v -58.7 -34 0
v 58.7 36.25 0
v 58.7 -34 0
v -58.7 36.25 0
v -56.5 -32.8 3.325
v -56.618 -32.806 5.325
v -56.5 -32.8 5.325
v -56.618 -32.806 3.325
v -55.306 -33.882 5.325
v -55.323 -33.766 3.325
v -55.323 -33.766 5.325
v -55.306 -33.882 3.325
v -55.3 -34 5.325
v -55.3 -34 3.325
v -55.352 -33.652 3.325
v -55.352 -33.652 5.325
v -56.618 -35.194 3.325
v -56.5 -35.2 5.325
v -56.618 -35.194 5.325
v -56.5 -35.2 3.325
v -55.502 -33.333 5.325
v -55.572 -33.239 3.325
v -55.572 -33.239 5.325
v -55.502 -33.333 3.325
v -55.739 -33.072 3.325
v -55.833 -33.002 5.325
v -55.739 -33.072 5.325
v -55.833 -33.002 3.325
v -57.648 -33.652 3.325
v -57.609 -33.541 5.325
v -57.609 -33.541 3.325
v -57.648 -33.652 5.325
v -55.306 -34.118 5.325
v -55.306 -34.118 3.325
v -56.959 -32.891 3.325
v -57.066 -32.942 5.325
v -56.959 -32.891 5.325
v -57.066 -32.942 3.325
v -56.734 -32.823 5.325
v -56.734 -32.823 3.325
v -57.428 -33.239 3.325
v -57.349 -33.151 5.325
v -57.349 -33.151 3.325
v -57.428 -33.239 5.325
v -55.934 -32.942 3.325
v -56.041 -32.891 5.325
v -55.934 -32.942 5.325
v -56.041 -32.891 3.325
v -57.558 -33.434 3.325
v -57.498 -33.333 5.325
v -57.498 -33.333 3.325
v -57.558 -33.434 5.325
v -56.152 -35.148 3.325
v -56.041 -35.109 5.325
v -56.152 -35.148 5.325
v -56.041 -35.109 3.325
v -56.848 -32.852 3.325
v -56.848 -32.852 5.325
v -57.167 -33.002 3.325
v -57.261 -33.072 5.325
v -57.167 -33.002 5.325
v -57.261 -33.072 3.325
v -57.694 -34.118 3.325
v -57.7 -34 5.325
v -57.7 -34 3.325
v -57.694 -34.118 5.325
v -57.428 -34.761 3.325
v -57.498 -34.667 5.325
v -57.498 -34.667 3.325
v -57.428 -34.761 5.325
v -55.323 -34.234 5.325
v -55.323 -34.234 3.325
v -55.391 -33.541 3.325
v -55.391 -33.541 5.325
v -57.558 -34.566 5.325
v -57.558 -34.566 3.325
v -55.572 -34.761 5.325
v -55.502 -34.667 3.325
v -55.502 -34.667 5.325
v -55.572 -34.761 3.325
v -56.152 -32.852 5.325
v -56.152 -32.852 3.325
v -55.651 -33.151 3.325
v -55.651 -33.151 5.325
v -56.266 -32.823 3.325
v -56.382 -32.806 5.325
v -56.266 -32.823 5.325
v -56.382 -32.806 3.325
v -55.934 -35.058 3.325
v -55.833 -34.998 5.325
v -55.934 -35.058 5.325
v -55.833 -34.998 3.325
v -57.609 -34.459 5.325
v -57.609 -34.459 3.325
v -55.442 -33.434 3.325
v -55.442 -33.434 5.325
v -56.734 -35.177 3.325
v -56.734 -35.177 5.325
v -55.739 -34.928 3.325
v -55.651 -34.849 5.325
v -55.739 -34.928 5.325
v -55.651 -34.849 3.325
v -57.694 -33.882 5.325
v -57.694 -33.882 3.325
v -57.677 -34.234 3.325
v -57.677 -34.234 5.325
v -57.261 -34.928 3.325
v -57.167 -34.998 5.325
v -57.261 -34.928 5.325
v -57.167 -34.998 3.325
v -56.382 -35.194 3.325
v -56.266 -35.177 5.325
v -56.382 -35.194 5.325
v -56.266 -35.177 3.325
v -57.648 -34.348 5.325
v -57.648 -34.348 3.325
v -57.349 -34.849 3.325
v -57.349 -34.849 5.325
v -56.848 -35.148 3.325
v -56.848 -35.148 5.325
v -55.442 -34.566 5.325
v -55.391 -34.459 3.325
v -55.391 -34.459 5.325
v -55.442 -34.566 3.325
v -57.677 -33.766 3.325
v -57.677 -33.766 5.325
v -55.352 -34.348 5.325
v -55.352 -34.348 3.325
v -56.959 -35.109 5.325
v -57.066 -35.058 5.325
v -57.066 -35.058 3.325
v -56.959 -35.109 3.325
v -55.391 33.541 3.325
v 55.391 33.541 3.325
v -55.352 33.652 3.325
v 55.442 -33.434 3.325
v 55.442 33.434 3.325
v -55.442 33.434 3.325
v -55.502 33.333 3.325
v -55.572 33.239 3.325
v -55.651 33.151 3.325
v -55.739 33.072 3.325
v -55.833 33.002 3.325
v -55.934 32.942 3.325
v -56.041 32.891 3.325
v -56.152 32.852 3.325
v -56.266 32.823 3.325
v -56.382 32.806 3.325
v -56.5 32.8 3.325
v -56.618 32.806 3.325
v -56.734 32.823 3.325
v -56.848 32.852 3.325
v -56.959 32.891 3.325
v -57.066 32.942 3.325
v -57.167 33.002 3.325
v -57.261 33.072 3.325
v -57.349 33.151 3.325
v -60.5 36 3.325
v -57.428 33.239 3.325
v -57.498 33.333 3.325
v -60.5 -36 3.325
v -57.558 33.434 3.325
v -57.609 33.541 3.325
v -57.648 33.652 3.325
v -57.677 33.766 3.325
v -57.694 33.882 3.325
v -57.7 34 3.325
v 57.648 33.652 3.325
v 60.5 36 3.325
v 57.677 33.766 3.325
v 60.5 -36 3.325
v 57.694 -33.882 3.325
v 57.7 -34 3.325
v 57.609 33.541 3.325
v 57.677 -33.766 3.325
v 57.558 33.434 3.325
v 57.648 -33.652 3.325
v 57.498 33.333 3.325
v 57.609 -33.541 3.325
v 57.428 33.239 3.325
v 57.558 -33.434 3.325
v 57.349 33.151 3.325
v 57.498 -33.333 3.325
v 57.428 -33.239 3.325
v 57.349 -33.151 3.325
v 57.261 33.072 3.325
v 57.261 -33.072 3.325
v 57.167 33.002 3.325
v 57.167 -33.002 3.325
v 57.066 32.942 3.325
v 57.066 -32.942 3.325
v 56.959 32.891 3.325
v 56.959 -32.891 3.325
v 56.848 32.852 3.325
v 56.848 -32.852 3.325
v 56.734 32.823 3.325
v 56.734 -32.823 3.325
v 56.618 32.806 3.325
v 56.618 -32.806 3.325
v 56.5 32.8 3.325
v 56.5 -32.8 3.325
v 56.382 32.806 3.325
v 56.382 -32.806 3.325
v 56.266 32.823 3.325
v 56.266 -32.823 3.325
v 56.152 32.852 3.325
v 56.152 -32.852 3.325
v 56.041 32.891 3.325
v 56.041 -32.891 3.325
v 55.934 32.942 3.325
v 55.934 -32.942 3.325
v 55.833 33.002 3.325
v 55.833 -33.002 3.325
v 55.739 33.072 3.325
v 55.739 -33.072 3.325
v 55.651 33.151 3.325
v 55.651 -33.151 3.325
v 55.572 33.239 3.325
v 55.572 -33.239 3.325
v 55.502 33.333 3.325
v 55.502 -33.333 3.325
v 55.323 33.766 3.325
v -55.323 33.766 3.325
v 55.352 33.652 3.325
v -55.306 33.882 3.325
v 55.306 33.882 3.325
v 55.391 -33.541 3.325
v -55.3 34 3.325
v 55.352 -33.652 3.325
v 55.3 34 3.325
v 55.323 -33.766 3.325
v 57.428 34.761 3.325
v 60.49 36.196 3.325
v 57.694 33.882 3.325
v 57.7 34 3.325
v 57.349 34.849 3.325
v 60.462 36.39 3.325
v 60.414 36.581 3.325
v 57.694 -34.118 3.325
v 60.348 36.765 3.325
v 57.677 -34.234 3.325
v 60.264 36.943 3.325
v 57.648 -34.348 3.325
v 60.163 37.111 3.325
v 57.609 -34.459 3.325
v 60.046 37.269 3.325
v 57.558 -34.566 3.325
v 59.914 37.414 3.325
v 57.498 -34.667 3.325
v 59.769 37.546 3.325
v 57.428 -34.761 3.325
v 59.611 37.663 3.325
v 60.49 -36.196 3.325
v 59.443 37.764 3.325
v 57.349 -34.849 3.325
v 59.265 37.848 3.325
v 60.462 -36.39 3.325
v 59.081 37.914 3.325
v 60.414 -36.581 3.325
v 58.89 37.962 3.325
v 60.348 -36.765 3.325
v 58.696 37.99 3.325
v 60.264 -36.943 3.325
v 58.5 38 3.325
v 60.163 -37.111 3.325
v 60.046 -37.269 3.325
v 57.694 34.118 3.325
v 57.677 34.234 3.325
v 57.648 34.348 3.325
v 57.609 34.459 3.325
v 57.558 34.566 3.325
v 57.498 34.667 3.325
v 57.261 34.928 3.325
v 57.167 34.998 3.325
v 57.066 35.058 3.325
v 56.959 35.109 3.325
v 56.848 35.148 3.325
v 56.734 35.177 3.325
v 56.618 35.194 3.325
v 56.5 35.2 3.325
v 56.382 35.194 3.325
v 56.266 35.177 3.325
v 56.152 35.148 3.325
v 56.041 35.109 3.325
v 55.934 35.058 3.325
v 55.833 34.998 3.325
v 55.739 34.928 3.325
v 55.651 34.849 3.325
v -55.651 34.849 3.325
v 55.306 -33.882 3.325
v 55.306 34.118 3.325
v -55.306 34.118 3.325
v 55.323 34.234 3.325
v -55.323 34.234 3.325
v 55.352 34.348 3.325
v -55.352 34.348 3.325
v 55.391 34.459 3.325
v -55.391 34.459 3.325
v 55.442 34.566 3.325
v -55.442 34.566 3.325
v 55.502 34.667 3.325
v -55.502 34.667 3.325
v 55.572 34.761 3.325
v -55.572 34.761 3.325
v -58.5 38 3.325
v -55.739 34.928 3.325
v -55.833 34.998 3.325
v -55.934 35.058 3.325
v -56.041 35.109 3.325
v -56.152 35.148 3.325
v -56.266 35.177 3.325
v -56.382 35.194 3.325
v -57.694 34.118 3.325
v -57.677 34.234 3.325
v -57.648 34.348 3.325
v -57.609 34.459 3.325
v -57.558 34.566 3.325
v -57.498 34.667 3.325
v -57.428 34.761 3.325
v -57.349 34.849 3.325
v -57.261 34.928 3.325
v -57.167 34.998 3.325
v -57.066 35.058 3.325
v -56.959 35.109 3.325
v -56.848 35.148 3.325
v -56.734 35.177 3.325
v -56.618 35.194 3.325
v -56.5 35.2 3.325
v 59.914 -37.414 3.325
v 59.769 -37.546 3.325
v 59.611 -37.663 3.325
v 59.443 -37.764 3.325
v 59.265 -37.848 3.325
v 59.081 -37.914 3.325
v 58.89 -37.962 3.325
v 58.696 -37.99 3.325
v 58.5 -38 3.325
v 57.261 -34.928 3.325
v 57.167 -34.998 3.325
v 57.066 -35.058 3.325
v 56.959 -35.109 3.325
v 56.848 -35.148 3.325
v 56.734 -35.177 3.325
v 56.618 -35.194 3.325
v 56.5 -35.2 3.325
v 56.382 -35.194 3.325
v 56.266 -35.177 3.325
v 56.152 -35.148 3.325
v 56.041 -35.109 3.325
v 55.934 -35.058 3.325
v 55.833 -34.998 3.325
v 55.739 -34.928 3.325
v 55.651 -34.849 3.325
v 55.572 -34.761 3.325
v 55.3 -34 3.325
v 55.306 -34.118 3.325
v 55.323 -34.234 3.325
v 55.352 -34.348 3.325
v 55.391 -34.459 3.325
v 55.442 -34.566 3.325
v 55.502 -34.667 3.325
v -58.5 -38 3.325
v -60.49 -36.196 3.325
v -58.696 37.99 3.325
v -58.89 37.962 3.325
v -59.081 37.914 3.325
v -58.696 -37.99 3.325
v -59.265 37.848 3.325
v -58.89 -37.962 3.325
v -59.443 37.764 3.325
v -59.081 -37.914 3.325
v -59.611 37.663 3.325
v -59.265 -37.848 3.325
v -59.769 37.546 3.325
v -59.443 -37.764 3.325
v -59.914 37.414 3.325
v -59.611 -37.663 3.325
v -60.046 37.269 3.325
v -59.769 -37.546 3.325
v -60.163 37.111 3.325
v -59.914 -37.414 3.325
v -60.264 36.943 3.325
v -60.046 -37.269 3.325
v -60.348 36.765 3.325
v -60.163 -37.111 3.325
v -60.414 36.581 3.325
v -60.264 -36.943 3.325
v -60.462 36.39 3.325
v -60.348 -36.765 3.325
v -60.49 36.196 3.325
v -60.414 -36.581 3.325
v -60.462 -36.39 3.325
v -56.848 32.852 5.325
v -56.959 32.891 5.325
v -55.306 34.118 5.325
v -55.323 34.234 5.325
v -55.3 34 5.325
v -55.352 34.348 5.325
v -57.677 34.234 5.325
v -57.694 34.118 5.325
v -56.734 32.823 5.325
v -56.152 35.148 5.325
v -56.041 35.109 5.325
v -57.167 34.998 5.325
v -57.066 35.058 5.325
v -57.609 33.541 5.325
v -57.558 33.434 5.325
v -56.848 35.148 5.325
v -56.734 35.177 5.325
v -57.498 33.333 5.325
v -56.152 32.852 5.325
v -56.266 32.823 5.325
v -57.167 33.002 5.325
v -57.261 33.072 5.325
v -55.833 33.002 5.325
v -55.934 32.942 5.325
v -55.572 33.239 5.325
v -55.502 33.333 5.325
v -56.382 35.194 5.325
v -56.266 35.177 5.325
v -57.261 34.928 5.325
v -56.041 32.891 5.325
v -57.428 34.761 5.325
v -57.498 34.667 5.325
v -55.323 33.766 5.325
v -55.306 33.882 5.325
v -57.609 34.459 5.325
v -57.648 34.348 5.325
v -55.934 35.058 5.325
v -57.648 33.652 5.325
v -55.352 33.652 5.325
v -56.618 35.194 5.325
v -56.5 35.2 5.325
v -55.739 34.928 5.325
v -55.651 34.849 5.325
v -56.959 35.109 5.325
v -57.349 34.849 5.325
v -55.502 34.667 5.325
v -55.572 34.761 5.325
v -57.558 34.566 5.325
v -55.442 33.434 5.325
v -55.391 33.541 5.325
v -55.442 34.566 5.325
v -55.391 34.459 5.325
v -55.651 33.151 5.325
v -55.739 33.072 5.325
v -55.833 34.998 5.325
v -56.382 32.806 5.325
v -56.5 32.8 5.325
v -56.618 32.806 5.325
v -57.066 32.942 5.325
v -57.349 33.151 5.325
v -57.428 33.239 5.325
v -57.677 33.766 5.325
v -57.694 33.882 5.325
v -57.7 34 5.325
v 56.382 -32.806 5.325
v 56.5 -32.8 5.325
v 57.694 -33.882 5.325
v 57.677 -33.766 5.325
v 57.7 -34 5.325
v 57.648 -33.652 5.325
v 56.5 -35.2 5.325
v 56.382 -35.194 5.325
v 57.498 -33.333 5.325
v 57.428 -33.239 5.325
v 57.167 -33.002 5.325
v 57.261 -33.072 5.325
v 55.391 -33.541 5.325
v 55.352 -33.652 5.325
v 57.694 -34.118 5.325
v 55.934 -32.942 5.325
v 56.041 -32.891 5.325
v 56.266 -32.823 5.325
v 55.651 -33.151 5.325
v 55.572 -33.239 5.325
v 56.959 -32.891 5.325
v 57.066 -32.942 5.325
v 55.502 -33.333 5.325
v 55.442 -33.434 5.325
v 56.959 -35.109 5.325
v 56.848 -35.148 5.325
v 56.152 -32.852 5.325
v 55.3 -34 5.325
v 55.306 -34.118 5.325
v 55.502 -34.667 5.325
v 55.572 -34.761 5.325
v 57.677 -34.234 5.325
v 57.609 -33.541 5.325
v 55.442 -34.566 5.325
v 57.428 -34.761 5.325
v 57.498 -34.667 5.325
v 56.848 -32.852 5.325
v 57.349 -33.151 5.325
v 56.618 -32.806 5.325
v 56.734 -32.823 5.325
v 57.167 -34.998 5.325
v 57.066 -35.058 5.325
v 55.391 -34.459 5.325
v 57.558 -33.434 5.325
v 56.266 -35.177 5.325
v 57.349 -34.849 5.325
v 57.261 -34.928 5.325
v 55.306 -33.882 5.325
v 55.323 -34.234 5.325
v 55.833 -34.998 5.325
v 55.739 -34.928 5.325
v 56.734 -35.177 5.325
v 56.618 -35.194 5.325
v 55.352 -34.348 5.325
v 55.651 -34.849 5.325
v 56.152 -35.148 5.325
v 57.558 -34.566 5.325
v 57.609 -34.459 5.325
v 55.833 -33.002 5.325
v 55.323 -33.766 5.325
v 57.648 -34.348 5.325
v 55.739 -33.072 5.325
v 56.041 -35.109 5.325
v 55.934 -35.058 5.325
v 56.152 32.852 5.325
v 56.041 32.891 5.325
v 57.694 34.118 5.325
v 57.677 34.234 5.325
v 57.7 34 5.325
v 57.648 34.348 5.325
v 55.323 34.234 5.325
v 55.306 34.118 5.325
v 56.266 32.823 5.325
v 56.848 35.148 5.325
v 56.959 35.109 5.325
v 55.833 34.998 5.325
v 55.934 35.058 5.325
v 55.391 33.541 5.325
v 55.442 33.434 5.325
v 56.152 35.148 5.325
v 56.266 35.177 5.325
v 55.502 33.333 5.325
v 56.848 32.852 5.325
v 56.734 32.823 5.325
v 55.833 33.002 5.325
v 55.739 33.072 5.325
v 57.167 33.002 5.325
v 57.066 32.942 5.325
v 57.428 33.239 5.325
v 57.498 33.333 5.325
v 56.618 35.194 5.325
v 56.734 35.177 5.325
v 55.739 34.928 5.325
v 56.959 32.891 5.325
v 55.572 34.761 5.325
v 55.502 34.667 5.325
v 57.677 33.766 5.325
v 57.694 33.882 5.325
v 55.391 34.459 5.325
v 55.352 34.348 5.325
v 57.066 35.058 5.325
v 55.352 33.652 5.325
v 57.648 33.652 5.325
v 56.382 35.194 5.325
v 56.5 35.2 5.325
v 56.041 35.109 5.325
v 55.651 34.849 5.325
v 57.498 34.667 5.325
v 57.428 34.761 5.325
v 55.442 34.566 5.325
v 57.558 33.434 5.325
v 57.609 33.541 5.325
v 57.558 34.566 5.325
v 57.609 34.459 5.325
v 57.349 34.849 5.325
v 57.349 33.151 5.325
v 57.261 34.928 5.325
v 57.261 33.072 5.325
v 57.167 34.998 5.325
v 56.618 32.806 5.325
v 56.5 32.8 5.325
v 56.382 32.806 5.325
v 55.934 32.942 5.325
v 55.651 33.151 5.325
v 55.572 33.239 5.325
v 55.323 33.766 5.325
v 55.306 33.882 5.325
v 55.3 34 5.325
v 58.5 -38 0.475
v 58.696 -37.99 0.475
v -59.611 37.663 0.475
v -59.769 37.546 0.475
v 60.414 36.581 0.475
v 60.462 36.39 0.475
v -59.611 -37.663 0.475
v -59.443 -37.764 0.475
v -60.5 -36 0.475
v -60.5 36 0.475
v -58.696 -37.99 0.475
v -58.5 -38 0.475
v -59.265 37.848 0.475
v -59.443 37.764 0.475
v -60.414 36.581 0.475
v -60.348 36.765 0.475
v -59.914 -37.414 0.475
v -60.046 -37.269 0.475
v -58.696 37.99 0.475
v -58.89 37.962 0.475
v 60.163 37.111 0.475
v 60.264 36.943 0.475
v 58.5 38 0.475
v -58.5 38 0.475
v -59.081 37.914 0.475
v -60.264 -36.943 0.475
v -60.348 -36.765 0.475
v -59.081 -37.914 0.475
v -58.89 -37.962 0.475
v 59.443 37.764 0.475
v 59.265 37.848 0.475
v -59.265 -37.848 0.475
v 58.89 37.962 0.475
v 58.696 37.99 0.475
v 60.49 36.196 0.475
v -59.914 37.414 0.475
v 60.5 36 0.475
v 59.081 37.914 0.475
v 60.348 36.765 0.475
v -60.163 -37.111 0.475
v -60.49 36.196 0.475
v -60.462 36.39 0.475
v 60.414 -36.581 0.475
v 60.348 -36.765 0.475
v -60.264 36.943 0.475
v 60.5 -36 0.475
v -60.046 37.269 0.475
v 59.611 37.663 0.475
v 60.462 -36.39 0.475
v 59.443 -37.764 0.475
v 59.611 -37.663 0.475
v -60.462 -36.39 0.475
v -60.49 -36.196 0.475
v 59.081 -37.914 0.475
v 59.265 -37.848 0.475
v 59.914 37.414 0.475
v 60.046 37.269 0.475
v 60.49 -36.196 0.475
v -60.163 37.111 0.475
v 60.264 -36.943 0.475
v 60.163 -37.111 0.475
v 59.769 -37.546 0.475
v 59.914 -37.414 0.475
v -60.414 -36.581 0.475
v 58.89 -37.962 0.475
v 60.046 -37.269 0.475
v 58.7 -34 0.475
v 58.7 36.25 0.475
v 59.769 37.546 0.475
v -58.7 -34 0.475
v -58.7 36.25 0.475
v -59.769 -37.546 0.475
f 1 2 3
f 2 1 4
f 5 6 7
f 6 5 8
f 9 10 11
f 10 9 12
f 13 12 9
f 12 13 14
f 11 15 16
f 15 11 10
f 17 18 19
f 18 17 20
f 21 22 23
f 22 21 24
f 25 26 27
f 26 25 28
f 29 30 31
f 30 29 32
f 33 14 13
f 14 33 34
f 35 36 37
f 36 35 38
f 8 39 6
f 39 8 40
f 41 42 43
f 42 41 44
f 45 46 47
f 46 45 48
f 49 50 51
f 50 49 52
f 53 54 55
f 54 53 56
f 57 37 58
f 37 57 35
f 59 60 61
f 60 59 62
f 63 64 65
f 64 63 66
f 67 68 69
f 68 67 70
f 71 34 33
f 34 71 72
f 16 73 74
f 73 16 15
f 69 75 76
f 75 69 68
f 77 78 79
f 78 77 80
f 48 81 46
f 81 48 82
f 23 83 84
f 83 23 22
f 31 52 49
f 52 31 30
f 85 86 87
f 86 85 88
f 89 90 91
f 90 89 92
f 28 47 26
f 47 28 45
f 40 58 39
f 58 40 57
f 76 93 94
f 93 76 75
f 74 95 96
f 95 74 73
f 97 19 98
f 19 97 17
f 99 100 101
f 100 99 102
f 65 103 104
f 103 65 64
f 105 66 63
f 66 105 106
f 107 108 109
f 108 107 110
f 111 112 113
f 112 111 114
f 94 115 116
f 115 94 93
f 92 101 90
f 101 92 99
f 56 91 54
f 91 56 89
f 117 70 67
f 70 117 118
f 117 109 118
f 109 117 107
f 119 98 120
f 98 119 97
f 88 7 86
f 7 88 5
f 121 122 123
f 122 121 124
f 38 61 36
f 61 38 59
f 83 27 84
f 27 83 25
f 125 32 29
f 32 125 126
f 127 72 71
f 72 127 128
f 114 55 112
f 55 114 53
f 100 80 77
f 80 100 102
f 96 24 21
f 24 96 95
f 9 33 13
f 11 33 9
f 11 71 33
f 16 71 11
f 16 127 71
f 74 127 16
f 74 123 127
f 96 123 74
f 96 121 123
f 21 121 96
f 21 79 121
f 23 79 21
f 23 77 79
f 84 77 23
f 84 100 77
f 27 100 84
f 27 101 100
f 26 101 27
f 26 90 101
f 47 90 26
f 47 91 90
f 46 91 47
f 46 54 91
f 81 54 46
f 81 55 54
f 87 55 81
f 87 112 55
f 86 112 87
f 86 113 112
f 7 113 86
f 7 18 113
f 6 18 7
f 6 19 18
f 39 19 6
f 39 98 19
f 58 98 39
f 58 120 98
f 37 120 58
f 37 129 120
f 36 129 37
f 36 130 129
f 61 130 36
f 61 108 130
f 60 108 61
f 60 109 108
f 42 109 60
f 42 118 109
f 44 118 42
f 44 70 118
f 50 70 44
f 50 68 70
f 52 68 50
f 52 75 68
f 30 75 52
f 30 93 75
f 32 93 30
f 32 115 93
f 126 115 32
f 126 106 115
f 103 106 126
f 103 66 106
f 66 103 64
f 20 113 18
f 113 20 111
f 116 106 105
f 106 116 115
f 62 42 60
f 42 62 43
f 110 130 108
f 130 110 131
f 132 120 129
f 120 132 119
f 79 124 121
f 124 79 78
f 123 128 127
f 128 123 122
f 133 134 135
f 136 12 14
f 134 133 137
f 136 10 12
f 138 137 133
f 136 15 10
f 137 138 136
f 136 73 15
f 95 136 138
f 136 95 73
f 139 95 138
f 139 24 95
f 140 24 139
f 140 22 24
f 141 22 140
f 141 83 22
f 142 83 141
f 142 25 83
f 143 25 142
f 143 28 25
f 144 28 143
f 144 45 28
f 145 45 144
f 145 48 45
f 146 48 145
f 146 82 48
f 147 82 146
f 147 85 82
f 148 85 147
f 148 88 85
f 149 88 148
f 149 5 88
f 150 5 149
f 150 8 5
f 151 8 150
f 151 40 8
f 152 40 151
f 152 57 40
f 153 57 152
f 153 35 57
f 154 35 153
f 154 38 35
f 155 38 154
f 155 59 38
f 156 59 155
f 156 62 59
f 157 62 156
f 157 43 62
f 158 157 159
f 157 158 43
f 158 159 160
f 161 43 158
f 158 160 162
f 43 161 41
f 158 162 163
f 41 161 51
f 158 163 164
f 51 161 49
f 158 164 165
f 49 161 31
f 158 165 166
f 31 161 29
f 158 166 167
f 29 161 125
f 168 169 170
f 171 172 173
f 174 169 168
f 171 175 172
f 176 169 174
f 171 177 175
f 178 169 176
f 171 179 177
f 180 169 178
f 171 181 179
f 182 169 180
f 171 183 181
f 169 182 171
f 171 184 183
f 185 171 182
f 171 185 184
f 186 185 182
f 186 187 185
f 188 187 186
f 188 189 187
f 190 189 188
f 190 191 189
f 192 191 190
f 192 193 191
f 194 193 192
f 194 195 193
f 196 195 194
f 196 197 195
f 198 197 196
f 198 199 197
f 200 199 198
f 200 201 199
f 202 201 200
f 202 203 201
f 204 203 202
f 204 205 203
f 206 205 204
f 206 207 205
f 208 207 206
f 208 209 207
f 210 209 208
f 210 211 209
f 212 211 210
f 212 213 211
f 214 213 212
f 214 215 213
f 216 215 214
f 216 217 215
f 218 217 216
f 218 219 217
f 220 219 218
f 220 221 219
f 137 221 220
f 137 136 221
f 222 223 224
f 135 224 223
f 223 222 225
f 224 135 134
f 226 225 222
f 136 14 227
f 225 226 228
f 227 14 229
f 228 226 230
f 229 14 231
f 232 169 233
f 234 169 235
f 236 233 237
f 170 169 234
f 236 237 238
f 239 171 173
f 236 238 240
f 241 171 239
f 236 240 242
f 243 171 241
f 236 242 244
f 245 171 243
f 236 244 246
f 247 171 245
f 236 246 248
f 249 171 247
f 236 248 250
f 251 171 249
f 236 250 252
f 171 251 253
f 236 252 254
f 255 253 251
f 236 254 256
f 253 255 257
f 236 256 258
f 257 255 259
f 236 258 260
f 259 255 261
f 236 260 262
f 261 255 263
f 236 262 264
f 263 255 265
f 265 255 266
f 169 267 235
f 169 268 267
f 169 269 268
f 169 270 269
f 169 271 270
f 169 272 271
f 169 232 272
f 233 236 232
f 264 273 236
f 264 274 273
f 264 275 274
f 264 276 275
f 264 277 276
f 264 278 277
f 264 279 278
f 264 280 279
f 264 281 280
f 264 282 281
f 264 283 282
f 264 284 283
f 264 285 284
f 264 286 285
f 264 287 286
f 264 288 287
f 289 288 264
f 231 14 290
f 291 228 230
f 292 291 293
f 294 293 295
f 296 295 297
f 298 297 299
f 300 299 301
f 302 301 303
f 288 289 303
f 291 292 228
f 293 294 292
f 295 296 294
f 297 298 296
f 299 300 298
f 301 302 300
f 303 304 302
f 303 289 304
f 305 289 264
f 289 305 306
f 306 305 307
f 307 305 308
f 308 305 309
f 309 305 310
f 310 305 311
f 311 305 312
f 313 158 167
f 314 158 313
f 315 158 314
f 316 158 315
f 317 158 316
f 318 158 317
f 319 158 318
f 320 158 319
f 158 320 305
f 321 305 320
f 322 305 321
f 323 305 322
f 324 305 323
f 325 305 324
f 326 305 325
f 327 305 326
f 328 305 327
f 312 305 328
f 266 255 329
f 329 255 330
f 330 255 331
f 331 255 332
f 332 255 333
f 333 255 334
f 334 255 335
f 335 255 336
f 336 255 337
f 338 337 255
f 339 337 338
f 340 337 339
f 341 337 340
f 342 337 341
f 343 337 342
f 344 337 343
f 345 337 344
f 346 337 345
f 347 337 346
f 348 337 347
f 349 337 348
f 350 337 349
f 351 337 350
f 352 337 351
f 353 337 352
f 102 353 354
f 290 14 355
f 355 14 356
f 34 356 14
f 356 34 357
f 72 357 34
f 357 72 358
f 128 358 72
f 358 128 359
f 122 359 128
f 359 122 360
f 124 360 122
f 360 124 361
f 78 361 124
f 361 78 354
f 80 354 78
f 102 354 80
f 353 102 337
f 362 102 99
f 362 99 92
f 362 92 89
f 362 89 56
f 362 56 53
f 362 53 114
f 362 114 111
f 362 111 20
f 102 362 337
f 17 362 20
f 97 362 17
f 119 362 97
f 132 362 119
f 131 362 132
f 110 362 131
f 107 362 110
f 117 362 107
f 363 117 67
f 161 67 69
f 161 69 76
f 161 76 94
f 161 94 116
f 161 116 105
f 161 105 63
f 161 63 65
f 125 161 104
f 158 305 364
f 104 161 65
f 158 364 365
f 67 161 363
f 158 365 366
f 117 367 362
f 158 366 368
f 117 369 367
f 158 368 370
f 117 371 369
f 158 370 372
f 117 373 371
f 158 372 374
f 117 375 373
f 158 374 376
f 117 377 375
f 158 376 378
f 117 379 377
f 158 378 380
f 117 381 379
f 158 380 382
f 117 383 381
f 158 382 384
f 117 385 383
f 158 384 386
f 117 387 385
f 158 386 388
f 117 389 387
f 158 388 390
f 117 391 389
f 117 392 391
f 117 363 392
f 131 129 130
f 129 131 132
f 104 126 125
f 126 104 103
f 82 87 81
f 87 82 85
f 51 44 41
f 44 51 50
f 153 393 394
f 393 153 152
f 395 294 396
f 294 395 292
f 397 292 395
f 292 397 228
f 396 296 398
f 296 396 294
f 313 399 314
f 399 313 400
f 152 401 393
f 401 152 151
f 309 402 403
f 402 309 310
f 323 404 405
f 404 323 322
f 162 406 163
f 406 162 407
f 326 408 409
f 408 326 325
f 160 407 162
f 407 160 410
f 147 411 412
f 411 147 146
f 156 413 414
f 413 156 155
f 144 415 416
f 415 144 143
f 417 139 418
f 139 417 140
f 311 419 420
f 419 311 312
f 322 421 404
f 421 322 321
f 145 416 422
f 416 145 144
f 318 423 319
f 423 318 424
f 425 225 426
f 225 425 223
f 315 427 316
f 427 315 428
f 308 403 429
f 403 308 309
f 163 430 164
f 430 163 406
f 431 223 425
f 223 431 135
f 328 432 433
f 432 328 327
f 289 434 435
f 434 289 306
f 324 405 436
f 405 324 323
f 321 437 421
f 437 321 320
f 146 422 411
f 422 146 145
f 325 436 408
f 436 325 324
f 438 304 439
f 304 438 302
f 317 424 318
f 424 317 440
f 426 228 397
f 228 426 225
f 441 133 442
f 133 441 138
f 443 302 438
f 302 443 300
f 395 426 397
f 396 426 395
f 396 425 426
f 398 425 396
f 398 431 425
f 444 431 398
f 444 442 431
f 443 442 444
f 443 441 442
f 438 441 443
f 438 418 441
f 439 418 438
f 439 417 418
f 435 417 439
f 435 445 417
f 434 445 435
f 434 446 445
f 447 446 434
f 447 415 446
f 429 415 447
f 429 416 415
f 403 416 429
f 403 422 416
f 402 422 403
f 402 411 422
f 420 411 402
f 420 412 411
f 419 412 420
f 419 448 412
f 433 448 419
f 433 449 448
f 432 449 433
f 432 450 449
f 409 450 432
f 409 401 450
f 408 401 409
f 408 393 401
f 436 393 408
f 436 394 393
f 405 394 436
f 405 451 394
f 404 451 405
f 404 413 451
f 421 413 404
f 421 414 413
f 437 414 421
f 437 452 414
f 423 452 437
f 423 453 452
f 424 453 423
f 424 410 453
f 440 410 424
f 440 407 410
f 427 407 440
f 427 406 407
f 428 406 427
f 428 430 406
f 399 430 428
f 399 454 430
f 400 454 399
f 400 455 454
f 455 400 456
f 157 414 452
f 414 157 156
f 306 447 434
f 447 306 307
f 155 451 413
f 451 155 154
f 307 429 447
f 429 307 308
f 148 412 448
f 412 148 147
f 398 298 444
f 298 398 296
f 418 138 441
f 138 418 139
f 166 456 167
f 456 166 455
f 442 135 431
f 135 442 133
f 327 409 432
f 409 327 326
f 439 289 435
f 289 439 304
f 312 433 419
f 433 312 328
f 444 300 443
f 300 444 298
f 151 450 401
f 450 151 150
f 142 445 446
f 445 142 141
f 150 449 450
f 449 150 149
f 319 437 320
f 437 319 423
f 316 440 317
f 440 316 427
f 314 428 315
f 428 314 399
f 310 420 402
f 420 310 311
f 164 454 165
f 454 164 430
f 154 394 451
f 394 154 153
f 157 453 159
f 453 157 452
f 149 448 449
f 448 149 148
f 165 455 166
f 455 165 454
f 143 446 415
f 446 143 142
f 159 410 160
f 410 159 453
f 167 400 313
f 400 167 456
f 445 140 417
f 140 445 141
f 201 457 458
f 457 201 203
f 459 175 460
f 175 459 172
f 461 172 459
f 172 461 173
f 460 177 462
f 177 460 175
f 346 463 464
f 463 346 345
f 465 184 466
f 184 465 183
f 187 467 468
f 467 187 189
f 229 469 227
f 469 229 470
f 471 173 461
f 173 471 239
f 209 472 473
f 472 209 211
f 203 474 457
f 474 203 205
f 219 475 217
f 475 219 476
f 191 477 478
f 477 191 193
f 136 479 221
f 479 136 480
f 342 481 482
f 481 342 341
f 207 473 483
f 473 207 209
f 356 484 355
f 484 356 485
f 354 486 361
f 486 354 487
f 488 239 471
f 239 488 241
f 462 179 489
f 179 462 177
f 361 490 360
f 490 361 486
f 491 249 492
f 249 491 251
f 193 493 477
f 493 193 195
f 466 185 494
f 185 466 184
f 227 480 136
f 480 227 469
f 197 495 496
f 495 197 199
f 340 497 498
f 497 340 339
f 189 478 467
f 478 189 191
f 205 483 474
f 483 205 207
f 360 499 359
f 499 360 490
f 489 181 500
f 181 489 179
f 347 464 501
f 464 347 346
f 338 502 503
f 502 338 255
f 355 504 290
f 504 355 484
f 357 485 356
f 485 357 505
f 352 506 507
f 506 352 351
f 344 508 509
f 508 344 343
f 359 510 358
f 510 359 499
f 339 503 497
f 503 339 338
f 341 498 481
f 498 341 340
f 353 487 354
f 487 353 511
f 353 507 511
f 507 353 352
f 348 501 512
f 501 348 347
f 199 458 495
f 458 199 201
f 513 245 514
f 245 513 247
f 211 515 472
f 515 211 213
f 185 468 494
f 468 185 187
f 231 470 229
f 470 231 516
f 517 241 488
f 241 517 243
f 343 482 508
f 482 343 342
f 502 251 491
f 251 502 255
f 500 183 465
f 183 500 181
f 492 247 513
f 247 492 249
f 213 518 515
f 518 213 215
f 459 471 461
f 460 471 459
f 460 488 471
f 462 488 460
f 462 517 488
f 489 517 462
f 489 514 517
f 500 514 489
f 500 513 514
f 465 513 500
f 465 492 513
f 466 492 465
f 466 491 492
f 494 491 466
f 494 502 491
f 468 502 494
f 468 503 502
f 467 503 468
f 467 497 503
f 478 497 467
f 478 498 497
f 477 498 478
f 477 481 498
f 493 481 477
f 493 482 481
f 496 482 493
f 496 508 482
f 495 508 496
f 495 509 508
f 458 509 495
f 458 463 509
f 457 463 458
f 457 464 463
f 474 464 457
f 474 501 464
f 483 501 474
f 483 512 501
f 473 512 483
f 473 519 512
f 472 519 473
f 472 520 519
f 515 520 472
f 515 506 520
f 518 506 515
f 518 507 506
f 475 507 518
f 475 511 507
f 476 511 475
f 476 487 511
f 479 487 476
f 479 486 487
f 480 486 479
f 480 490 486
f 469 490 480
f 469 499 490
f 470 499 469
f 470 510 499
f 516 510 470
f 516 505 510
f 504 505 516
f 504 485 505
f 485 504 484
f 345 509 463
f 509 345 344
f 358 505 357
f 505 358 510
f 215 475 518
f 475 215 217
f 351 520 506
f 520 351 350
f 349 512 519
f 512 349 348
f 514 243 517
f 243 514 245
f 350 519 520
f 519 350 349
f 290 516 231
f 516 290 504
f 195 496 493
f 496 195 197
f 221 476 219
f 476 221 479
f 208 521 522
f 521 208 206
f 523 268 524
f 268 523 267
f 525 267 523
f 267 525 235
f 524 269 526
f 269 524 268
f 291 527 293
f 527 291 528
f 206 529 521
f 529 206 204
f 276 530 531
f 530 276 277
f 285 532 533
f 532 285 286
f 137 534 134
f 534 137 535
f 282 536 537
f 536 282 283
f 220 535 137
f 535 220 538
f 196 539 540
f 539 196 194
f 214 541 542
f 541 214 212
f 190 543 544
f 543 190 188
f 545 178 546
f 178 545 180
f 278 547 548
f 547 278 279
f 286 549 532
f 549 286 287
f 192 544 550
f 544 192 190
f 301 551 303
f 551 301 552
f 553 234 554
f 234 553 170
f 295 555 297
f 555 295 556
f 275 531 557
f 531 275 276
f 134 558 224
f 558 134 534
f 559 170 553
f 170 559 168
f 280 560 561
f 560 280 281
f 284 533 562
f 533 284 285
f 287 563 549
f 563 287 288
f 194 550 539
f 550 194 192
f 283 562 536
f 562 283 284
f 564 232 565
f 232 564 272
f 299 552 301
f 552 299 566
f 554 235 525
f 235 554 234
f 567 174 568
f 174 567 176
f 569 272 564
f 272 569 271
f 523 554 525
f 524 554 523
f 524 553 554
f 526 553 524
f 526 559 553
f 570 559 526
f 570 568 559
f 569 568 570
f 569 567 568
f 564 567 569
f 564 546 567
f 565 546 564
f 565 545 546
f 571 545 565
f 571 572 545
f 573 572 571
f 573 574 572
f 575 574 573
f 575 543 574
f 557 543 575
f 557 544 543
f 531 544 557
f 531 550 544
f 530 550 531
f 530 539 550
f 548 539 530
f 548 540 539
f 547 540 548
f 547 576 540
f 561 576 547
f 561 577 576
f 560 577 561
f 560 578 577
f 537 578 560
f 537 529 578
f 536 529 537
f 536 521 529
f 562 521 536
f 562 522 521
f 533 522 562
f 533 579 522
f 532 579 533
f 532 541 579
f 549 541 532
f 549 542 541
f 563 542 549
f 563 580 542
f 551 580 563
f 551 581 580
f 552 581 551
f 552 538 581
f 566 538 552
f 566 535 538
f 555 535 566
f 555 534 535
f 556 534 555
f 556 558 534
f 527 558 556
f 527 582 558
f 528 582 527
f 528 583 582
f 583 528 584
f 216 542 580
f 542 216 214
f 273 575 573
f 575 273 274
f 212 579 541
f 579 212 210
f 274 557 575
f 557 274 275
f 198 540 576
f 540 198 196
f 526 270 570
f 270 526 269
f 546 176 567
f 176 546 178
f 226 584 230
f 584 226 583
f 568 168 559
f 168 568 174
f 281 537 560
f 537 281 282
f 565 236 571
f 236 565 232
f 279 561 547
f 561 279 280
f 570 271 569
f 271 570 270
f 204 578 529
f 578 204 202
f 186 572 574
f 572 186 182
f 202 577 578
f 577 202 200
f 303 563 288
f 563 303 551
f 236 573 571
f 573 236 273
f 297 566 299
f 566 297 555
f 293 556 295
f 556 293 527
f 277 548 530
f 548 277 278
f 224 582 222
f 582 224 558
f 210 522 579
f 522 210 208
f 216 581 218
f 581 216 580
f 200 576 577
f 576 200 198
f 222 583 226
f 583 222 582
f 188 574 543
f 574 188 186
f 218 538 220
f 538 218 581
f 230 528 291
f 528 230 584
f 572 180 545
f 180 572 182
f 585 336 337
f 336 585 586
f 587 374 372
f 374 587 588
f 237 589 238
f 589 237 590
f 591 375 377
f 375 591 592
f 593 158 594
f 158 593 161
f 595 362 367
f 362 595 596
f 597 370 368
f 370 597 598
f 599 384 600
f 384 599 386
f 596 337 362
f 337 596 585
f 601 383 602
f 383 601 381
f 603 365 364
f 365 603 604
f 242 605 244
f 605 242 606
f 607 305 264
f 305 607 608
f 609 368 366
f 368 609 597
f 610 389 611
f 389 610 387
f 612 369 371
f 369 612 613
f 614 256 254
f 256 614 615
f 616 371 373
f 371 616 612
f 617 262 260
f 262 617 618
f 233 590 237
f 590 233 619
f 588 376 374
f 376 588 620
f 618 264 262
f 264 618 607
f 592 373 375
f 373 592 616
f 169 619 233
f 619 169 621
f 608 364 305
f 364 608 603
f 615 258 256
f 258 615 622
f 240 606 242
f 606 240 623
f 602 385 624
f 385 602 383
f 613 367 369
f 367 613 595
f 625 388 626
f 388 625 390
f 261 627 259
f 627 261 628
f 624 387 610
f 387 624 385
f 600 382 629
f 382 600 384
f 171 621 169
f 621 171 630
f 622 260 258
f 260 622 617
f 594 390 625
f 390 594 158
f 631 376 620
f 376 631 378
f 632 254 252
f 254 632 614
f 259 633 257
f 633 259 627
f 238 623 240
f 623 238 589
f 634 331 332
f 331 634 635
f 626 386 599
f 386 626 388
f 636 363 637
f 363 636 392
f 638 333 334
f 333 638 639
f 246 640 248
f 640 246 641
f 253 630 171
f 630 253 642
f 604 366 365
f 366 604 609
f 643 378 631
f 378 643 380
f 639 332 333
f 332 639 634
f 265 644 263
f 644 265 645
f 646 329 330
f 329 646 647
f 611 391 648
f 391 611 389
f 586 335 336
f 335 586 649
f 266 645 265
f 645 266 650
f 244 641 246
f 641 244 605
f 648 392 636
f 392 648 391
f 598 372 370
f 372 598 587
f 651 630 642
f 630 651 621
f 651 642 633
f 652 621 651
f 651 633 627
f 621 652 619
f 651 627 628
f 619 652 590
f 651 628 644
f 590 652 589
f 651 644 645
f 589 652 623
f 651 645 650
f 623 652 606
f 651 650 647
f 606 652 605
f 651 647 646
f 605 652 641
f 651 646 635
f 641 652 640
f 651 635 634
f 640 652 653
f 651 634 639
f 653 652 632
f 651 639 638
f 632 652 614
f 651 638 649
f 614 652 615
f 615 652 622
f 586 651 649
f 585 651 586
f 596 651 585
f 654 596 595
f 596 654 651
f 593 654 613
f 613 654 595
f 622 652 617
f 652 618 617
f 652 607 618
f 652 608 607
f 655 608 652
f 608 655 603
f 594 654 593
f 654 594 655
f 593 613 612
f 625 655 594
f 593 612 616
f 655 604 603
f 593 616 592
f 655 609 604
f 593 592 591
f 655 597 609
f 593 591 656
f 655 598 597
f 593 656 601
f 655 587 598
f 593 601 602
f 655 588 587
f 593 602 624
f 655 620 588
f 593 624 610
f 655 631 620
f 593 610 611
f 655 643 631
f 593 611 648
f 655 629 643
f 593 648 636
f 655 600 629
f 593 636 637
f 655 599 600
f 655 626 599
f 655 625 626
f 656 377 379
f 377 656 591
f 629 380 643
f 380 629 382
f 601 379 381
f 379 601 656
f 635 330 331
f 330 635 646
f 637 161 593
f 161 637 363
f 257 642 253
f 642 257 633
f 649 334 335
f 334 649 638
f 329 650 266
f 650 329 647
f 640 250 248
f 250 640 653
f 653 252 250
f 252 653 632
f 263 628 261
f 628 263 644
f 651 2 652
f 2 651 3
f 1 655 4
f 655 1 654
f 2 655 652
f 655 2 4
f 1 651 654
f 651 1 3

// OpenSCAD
$fn=64;

module rounded_rect_2d(size=[10,10], r=1){
    w=size[0]; h=size[1];
    r2 = min(r, min(w,h)/2);
    offset(r=r2) offset(delta=-r2) square([w,h], center=true);
}

module rounded_box(size=[10,10,2], r=1){
    w=size[0]; h=size[1]; t=size[2];
    r2 = min(r, min(w,h)/2);
    linear_extrude(height=t, center=true)
        rounded_rect_2d([w,h], r2);
}

module rect_prism_xy(p1=[-5,-5], p2=[5,5], z=1, center_z=true){
    x1=min(p1[0],p2[0]); x2=max(p1[0],p2[0]);
    y1=min(p1[1],p2[1]); y2=max(p1[1],p2[1]);
    w=x2-x1; h=y2-y1;
    cx=(x1+x2)/2; cy=(y1+y2)/2;
    translate([cx,cy,0])
        cube([w,h,z], center=center_z);
}

module display_hdmi_5in(
    pcb_size=[121,76,2.85],
    pcb_offset=[0,0,1.9],
    aperture=[[-54,-30.225],[54,34.575,0.5]],
    touch=[[-58.7,-34],[58.7,36.25,1]],
    thread_len=2,
    ribbon_clear=[[-2.5,-39],[10.5,-33]],
    pcb_corner_r=2.0
){
    union(){
        translate(pcb_offset)
            color([0,0.5,0])
                rounded_box(pcb_size, pcb_corner_r);

        color([0.05,0.05,0.05,0.35])
            translate([0,0, (touch[1][2])/2])
                rect_prism_xy(touch[0], [touch[1][0], touch[1][1]], touch[1][2], center_z=true);

        difference(){
            translate([0,0, (aperture[1][2])/2])
                rect_prism_xy(aperture[0], [aperture[1][0], aperture[1][1]], aperture[1][2], center_z=true);

            translate([0,0, (aperture[1][2])/2])
                rect_prism_xy(ribbon_clear[0], ribbon_clear[1], aperture[1][2]+0.2, center_z=true);
        }

        for(x=[-1,1], y=[-1,1]){
            translate([x*(pcb_size[0]/2-4), y*(pcb_size[1]/2-4), pcb_offset[2] + pcb_size[2]/2 + thread_len/2])
                cylinder(d=2.4, h=thread_len, center=true);
        }
    }
}

display_hdmi_5in();
